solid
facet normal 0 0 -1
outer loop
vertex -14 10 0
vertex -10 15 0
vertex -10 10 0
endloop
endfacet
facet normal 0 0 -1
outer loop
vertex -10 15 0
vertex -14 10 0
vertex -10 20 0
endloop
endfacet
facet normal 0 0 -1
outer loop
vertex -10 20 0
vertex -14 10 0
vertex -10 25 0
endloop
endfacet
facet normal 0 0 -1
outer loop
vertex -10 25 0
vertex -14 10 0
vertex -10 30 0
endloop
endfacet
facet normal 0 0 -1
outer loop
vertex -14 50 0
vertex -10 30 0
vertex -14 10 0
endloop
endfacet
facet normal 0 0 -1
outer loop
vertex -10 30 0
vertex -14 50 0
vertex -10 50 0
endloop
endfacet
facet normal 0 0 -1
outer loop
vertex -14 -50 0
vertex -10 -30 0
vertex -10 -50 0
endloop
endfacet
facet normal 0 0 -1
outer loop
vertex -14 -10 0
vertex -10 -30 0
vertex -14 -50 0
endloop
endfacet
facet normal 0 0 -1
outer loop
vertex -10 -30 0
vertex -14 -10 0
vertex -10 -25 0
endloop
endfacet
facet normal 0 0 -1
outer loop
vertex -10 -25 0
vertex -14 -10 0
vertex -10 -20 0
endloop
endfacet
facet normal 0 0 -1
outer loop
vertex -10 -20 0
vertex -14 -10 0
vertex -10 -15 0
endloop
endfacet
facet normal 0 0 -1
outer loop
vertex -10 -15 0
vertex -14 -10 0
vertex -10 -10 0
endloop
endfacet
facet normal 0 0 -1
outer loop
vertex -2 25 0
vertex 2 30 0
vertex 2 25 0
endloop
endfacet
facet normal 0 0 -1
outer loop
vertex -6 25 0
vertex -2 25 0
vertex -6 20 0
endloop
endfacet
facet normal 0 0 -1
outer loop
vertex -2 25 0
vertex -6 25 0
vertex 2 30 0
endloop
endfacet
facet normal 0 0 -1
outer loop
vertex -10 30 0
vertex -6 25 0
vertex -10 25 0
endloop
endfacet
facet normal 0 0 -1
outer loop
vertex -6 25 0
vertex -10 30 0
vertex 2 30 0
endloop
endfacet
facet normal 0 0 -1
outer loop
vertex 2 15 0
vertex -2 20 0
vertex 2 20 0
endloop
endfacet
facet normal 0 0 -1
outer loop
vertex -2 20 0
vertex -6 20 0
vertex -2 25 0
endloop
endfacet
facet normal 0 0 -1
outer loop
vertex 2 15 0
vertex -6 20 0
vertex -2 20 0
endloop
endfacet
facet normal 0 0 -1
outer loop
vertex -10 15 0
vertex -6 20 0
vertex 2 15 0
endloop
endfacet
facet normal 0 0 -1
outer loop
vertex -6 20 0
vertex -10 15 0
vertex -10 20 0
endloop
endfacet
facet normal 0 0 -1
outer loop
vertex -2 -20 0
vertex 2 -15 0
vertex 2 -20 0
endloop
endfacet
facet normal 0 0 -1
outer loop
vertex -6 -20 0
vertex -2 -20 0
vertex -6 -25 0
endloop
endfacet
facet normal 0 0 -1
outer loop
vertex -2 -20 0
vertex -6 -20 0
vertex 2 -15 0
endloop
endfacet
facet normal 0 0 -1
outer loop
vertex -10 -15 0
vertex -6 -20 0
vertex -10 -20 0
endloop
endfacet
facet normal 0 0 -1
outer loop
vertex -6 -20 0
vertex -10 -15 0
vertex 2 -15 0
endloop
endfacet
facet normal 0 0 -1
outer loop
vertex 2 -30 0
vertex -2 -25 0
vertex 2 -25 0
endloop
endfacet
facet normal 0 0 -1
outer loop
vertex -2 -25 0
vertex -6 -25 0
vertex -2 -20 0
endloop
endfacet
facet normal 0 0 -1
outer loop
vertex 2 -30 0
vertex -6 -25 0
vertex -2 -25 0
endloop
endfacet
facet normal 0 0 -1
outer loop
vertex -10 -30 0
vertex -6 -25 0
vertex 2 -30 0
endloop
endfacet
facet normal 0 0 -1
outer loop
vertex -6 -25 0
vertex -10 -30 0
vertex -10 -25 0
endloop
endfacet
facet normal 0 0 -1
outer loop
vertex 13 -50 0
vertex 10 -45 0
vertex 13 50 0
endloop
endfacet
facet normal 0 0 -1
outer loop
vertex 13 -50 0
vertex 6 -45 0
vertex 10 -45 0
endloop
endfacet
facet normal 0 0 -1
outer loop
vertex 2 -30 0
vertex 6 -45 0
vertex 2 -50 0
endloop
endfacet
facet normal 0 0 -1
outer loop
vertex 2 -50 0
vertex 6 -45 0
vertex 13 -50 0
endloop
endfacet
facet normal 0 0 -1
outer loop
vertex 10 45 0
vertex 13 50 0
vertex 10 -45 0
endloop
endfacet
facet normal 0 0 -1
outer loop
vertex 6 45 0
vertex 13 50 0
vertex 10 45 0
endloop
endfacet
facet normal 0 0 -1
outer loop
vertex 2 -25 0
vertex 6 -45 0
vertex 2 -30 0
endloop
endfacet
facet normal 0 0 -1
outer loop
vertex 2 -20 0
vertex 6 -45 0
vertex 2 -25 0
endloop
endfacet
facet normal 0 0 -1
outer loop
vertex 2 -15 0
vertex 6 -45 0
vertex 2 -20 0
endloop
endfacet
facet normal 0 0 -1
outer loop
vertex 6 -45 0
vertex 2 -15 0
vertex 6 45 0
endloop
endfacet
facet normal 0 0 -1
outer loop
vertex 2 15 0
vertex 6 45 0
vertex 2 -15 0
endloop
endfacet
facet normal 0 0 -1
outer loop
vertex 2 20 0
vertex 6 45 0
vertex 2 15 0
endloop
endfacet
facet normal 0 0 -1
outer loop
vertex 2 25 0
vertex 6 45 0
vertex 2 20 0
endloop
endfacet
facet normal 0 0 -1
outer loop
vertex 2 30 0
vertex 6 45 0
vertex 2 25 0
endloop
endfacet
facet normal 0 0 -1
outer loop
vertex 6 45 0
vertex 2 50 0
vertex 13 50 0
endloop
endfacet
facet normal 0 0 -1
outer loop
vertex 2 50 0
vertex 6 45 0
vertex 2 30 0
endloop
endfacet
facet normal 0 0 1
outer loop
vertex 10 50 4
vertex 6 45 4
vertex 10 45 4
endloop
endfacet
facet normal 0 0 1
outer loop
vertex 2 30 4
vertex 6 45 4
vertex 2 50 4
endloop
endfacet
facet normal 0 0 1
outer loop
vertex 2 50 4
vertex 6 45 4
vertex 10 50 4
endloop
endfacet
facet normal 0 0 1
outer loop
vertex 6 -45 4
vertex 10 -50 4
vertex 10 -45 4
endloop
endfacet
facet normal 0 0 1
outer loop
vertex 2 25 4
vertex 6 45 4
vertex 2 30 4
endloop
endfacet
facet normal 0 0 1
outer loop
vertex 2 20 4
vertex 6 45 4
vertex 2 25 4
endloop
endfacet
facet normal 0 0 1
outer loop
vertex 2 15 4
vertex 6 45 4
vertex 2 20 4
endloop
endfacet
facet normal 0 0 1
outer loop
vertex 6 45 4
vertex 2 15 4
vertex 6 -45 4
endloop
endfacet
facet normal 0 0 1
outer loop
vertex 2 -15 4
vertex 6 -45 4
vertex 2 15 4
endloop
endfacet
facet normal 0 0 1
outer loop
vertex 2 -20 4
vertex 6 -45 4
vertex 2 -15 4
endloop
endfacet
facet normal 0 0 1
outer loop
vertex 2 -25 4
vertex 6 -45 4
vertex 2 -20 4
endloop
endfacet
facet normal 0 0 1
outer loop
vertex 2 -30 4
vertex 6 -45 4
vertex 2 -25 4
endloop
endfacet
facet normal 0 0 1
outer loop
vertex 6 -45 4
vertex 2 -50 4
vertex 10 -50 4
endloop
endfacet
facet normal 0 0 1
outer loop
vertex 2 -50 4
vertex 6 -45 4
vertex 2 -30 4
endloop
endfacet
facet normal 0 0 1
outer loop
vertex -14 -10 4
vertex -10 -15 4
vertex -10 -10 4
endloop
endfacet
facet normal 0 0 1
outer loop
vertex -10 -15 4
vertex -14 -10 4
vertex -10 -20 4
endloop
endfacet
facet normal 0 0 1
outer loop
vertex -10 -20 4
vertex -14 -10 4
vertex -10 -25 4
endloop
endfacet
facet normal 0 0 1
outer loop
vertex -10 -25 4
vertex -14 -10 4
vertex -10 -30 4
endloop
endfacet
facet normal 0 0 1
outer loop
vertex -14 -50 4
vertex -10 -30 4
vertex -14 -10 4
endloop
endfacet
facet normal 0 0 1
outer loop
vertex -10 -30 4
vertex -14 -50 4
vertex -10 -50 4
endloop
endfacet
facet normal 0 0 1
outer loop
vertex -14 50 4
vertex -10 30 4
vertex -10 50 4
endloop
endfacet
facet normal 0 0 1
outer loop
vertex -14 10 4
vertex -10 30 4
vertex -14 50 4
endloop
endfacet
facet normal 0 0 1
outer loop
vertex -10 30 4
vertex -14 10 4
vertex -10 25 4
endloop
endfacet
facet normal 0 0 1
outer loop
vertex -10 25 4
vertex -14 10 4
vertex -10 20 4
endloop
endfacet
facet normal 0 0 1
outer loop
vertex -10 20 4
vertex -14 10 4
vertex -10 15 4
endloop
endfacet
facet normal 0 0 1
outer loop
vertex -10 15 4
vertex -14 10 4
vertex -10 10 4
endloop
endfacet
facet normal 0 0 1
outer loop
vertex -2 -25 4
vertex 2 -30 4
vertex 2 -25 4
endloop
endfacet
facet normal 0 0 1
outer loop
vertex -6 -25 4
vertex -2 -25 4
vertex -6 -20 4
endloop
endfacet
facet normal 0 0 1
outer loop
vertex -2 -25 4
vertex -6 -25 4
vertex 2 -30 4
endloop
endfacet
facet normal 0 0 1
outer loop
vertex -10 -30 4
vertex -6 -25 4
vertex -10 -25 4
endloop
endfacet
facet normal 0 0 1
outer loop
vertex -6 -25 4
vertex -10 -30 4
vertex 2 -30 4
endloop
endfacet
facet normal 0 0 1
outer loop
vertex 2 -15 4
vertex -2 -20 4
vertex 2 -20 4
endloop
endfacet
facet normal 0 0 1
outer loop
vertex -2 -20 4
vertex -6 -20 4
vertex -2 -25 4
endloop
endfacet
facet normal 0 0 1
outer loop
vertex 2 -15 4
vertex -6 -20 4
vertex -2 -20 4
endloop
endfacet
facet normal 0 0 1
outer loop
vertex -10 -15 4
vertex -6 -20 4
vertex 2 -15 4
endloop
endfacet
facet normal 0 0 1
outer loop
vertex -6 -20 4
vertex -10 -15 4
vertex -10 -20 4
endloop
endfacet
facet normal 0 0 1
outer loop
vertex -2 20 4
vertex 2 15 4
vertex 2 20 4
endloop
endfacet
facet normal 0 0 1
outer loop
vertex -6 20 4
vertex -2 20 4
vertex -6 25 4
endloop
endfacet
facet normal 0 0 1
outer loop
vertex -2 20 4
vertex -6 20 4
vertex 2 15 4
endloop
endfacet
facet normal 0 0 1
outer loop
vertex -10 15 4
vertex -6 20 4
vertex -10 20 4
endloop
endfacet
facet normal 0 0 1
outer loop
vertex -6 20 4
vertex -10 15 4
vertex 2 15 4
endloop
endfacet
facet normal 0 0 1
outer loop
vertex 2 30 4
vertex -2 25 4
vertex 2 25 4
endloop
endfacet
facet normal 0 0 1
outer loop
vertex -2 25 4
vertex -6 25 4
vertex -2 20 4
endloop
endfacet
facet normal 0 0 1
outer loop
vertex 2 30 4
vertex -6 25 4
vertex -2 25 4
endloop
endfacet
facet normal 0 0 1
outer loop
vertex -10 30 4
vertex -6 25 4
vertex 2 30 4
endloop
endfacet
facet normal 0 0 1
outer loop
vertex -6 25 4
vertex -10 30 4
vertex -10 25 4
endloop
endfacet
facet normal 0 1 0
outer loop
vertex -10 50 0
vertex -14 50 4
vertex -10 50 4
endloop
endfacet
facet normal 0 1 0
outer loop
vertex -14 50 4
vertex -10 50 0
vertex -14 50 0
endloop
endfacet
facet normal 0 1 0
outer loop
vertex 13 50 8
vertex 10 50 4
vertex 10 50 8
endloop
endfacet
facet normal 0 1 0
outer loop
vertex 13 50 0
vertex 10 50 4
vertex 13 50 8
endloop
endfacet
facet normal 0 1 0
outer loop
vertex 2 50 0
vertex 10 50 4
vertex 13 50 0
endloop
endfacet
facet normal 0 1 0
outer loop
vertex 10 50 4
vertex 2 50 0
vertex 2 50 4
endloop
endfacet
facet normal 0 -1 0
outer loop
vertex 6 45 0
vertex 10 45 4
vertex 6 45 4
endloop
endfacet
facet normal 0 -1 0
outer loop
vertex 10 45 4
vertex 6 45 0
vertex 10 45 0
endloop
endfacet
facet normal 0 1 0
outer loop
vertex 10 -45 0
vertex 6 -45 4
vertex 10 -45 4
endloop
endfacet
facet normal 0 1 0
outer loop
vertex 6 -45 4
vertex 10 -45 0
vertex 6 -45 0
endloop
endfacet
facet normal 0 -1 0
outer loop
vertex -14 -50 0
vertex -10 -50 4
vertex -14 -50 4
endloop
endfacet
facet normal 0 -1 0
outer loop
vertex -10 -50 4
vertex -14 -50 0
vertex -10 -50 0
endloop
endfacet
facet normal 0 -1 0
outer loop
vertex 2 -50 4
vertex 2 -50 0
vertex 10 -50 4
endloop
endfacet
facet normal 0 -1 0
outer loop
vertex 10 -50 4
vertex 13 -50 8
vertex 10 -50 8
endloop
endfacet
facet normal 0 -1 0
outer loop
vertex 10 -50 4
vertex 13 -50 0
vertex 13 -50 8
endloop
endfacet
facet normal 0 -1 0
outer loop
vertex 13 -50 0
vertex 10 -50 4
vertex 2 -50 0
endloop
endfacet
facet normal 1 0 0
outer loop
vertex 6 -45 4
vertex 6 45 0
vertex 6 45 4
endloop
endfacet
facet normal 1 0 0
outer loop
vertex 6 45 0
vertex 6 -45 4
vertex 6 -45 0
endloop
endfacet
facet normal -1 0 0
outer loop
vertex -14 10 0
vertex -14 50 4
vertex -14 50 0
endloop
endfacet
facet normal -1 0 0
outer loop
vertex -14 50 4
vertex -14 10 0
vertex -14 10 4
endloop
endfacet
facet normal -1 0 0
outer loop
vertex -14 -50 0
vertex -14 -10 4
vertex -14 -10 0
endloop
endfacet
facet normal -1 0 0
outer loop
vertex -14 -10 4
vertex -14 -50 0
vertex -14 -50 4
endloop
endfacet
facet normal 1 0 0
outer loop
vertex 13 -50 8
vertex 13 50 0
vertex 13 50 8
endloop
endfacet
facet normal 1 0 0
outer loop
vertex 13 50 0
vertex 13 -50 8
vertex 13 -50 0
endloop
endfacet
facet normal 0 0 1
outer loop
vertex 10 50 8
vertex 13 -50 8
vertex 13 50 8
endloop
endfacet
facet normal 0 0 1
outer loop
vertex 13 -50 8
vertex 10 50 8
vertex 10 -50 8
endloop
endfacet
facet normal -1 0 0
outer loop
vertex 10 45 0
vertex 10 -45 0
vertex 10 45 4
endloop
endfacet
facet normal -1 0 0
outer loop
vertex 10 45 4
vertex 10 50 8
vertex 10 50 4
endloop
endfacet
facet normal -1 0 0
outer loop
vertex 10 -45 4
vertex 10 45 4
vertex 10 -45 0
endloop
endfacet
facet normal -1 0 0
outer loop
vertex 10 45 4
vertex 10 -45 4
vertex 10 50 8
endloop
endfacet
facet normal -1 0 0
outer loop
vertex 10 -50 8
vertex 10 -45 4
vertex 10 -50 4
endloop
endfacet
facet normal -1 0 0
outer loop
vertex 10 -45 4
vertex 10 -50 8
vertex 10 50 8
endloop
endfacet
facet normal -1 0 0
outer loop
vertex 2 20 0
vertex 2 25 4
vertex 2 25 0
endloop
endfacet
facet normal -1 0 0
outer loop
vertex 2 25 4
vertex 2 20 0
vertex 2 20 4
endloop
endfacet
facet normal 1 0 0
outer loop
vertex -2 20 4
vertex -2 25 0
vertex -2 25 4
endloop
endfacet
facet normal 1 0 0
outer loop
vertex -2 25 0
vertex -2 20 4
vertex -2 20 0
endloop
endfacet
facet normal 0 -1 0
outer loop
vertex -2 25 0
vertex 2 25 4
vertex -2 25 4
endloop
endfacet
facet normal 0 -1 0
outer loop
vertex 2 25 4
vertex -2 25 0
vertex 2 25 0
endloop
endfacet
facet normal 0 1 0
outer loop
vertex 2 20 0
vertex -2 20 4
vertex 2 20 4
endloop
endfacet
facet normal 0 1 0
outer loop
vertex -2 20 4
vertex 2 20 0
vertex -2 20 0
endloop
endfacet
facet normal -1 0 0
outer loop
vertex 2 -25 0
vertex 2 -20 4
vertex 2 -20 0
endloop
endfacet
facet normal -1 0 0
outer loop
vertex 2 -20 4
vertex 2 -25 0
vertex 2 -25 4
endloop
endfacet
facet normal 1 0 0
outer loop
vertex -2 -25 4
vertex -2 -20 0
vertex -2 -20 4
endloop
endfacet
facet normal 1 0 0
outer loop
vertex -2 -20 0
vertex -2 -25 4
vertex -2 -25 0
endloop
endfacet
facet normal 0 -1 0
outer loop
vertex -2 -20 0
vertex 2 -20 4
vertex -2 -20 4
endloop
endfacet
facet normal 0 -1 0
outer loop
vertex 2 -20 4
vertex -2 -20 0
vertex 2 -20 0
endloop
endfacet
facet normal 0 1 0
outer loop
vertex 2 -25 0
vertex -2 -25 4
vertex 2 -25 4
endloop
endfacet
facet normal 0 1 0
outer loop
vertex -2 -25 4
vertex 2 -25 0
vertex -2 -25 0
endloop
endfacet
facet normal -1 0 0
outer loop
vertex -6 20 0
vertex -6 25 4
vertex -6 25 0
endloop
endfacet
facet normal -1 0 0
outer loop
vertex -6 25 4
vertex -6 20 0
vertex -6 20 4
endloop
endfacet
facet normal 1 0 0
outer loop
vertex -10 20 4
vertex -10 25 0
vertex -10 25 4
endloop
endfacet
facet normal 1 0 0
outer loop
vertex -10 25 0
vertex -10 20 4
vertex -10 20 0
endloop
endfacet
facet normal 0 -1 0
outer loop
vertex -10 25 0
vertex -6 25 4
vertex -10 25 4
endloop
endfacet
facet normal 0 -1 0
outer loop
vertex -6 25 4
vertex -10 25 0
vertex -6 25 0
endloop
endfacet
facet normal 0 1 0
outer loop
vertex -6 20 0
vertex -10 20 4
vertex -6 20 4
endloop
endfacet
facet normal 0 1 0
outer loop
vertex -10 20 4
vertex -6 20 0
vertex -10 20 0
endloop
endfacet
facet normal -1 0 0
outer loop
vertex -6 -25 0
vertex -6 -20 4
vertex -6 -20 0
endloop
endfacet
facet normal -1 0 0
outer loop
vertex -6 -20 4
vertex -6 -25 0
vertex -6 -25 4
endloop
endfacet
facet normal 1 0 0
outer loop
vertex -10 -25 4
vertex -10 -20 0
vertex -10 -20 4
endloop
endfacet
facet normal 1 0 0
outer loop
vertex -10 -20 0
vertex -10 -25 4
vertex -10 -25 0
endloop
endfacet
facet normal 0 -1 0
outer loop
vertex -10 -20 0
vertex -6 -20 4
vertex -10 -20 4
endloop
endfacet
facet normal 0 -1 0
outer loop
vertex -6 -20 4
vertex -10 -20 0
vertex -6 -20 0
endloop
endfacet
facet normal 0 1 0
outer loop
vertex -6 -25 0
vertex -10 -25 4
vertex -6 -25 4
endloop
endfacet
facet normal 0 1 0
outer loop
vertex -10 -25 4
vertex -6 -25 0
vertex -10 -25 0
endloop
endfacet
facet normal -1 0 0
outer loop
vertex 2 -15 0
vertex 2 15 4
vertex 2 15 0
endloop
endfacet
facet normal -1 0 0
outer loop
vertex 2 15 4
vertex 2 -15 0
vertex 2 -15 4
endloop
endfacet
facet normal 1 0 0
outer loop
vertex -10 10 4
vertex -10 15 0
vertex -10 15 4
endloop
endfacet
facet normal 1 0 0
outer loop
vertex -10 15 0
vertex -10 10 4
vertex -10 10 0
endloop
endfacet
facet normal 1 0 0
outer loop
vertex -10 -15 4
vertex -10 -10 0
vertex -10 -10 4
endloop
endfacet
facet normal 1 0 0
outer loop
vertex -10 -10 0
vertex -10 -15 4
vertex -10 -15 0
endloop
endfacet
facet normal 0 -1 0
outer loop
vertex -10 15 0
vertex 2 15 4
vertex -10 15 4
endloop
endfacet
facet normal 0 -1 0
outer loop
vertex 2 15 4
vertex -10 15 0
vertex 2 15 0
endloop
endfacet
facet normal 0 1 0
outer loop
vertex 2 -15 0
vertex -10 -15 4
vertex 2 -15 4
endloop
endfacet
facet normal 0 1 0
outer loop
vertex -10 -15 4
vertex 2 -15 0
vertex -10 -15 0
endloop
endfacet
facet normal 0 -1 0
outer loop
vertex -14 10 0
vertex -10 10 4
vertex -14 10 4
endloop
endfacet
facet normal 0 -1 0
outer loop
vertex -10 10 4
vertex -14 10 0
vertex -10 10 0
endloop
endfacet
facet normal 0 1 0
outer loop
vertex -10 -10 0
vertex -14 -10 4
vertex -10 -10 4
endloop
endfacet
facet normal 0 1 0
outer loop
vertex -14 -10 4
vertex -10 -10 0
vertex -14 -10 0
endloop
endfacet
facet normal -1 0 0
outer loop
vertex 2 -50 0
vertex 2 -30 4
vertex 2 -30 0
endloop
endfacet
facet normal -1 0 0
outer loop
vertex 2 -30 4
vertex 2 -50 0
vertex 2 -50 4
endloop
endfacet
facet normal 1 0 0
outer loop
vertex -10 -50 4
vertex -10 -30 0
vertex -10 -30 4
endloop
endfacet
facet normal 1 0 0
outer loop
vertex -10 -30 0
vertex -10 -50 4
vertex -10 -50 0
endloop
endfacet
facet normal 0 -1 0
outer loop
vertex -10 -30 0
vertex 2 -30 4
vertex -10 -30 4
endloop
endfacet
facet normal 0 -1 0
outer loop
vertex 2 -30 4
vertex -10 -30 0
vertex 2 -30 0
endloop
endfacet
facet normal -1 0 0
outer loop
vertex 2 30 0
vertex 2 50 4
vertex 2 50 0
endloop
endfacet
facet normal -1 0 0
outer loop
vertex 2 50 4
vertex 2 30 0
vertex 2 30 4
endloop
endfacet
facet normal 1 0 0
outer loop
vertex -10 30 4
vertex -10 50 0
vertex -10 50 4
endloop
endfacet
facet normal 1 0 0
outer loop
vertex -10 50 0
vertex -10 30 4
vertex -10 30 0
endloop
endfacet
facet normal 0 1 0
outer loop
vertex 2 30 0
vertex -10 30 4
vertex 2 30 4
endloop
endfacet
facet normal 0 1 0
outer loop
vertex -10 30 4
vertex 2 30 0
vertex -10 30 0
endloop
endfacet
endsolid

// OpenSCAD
difference()
{
    union()
    {
        translate([-14, -50, 0])
            cube(size=[20,100,4], center=false);

        translate([10, -50, 0])
            cube(size=[3,100,8], center=false);
            
        rotate(a=90, v=[0,1,0]) 
        {
            /*Device handler*/
            translate([0,25,10])
                translate([-4,20,-10])
                    cube(size=[4,5,12], center=false);

            translate([0,-25,10])
                translate([-4,-25,-10])
                    cube(size=[4,5,12], center=false);
        }
    }

    rotate(a=90, v=[0,1,0])
    {
        /*Device handler holes*/
        translate([0,0,2])
            translate([-50,20,-4])
                cube(size=[100,5,4], center=false);

        translate([0,0,2])
            translate([-50,-25,-4])
                cube(size=[100,5,4], center=false);


        translate([0,0,2-2-4-2])
            translate([-50,20,-4])
                cube(size=[100,5,4], center=false);

        translate([0,0,2-2-4-2])
            translate([-50,-25,-4])
                cube(size=[100,5,4], center=false);

        /*central hole*/
        translate([0,0,2-2-4-2])
            translate([-40,-15,-4])
                cube(size=[100,30,12], center=false);

        /*central cut hole*/
        translate([0,0,2-2-4-2])
            translate([-40,-10,-4-5])
                cube(size=[100,20,12], center=false);

        /*side hole*/
        translate([0,0,2-2-4-2])
            translate([-40,-60,-4])
                cube(size=[100,30,12], center=false);

        /*side hole*/
        translate([0,0,2-2-4-2])
            translate([-40,30,-4])
                cube(size=[100,30,12], center=false);
    }


}
